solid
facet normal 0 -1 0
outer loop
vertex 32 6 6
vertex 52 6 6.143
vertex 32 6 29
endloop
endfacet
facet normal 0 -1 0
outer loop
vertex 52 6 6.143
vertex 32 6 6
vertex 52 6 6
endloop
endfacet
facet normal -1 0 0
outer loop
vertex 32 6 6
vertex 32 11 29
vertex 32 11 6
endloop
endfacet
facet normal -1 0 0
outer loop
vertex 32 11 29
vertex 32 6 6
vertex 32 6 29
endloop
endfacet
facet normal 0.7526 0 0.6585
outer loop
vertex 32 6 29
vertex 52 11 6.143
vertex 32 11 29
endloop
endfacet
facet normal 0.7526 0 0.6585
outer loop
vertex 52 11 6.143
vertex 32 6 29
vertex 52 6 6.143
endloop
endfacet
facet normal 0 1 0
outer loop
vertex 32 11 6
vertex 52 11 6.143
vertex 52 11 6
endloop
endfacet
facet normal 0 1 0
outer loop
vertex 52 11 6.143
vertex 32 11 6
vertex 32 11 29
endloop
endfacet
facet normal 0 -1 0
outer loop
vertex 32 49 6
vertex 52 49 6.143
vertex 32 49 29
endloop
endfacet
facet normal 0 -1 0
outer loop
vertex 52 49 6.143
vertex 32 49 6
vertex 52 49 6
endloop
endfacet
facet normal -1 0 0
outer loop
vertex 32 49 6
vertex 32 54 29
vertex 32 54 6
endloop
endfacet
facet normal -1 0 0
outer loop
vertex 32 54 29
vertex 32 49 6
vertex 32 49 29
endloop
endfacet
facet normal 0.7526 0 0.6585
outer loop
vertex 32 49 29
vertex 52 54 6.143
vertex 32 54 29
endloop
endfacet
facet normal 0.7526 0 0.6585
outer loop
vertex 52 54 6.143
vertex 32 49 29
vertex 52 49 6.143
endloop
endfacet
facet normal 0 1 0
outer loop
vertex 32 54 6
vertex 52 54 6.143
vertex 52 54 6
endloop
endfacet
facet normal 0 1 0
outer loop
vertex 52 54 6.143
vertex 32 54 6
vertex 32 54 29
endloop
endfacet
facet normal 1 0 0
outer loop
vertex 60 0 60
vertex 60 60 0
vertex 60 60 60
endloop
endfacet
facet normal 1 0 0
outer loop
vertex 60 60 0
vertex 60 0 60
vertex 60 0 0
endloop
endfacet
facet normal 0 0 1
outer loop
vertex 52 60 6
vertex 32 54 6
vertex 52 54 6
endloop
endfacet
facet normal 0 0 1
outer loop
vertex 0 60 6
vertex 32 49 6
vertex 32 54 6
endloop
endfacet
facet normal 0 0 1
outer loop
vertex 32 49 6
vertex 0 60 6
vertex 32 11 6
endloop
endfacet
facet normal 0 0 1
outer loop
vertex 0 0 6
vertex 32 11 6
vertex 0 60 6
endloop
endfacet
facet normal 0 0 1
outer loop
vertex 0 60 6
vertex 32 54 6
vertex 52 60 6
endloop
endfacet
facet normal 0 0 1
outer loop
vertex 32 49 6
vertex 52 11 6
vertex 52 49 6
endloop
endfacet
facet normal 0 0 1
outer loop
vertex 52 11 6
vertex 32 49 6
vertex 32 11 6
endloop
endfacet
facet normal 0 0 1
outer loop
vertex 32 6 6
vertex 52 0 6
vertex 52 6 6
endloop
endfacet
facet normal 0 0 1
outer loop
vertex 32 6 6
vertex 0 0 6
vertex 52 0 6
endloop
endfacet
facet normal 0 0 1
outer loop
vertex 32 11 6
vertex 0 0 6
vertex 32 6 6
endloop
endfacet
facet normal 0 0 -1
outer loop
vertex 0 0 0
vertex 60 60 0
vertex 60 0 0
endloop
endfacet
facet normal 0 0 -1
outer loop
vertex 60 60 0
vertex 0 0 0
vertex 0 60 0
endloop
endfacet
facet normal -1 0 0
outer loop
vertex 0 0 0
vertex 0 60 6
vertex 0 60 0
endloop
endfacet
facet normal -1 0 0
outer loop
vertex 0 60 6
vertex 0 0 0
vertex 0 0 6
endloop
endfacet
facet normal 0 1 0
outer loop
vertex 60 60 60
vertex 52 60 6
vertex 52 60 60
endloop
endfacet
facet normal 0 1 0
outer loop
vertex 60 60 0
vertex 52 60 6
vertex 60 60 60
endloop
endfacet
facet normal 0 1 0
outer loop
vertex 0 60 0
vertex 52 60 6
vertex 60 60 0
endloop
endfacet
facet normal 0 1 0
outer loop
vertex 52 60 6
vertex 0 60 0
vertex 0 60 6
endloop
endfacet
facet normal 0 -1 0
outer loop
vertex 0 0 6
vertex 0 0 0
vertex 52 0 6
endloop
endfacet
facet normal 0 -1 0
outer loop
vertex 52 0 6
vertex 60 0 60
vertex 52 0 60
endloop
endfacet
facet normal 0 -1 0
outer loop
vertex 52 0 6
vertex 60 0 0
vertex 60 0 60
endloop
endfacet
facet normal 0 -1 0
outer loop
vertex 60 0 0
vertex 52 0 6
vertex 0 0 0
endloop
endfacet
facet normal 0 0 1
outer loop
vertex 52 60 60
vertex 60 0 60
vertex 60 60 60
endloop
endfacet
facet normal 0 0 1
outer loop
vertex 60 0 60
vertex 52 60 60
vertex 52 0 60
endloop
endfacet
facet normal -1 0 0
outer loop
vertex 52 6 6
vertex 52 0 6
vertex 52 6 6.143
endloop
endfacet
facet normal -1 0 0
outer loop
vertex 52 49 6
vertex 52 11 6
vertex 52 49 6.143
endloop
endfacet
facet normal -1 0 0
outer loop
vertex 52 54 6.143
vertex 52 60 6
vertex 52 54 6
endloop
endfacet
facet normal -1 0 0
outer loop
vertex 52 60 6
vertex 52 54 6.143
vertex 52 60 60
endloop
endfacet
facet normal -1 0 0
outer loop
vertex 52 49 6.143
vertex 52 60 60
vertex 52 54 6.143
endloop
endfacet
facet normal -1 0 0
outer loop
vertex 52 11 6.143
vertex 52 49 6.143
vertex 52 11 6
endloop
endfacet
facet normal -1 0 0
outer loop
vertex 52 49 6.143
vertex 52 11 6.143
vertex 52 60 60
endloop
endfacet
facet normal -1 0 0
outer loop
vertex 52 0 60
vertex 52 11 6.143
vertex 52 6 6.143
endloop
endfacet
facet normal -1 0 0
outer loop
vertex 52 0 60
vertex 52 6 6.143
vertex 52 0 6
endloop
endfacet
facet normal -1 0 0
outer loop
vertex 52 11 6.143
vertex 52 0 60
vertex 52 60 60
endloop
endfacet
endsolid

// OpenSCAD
$fn = 32;

// ----------------------------------------------------------------------
// Rib bracket: 2-gusset L bracket
// ----------------------------------------------------------------------

// --- parameters (mm) ---
base_l = 60;              // foot length, X
base_w = 60;              // foot width, Y
base_t = 6;               // foot thickness
plate_t = 8;              // upright plate thickness
plate_h = 60;             // overall height
gus_l = 20;               // gusset leg along the foot
gus_h = 24;               // gusset height
gus_t = 5;                // gusset thickness
gus_edge = 6;             // gusset margin from the foot edge
n_gus = 2;                // gusset count

gus_pitch = (base_w - 2 * gus_edge - gus_t) / (n_gus - 1);  // gusset pitch

union() {
  cube([base_l, base_w, base_t]);
  translate([base_l - plate_t, 0, base_t - 1])
    cube([plate_t, base_w, plate_h - base_t + 1]);
  for (i = [0 : n_gus - 1])
    translate([base_l - plate_t - gus_l, gus_edge + i * gus_pitch, base_t - 1])
      rotate([-90, 0, 0])
        linear_extrude(height = gus_t)
          polygon(points = [[0, 0], [gus_l + 1, 0], [0, -gus_h]]);
}
